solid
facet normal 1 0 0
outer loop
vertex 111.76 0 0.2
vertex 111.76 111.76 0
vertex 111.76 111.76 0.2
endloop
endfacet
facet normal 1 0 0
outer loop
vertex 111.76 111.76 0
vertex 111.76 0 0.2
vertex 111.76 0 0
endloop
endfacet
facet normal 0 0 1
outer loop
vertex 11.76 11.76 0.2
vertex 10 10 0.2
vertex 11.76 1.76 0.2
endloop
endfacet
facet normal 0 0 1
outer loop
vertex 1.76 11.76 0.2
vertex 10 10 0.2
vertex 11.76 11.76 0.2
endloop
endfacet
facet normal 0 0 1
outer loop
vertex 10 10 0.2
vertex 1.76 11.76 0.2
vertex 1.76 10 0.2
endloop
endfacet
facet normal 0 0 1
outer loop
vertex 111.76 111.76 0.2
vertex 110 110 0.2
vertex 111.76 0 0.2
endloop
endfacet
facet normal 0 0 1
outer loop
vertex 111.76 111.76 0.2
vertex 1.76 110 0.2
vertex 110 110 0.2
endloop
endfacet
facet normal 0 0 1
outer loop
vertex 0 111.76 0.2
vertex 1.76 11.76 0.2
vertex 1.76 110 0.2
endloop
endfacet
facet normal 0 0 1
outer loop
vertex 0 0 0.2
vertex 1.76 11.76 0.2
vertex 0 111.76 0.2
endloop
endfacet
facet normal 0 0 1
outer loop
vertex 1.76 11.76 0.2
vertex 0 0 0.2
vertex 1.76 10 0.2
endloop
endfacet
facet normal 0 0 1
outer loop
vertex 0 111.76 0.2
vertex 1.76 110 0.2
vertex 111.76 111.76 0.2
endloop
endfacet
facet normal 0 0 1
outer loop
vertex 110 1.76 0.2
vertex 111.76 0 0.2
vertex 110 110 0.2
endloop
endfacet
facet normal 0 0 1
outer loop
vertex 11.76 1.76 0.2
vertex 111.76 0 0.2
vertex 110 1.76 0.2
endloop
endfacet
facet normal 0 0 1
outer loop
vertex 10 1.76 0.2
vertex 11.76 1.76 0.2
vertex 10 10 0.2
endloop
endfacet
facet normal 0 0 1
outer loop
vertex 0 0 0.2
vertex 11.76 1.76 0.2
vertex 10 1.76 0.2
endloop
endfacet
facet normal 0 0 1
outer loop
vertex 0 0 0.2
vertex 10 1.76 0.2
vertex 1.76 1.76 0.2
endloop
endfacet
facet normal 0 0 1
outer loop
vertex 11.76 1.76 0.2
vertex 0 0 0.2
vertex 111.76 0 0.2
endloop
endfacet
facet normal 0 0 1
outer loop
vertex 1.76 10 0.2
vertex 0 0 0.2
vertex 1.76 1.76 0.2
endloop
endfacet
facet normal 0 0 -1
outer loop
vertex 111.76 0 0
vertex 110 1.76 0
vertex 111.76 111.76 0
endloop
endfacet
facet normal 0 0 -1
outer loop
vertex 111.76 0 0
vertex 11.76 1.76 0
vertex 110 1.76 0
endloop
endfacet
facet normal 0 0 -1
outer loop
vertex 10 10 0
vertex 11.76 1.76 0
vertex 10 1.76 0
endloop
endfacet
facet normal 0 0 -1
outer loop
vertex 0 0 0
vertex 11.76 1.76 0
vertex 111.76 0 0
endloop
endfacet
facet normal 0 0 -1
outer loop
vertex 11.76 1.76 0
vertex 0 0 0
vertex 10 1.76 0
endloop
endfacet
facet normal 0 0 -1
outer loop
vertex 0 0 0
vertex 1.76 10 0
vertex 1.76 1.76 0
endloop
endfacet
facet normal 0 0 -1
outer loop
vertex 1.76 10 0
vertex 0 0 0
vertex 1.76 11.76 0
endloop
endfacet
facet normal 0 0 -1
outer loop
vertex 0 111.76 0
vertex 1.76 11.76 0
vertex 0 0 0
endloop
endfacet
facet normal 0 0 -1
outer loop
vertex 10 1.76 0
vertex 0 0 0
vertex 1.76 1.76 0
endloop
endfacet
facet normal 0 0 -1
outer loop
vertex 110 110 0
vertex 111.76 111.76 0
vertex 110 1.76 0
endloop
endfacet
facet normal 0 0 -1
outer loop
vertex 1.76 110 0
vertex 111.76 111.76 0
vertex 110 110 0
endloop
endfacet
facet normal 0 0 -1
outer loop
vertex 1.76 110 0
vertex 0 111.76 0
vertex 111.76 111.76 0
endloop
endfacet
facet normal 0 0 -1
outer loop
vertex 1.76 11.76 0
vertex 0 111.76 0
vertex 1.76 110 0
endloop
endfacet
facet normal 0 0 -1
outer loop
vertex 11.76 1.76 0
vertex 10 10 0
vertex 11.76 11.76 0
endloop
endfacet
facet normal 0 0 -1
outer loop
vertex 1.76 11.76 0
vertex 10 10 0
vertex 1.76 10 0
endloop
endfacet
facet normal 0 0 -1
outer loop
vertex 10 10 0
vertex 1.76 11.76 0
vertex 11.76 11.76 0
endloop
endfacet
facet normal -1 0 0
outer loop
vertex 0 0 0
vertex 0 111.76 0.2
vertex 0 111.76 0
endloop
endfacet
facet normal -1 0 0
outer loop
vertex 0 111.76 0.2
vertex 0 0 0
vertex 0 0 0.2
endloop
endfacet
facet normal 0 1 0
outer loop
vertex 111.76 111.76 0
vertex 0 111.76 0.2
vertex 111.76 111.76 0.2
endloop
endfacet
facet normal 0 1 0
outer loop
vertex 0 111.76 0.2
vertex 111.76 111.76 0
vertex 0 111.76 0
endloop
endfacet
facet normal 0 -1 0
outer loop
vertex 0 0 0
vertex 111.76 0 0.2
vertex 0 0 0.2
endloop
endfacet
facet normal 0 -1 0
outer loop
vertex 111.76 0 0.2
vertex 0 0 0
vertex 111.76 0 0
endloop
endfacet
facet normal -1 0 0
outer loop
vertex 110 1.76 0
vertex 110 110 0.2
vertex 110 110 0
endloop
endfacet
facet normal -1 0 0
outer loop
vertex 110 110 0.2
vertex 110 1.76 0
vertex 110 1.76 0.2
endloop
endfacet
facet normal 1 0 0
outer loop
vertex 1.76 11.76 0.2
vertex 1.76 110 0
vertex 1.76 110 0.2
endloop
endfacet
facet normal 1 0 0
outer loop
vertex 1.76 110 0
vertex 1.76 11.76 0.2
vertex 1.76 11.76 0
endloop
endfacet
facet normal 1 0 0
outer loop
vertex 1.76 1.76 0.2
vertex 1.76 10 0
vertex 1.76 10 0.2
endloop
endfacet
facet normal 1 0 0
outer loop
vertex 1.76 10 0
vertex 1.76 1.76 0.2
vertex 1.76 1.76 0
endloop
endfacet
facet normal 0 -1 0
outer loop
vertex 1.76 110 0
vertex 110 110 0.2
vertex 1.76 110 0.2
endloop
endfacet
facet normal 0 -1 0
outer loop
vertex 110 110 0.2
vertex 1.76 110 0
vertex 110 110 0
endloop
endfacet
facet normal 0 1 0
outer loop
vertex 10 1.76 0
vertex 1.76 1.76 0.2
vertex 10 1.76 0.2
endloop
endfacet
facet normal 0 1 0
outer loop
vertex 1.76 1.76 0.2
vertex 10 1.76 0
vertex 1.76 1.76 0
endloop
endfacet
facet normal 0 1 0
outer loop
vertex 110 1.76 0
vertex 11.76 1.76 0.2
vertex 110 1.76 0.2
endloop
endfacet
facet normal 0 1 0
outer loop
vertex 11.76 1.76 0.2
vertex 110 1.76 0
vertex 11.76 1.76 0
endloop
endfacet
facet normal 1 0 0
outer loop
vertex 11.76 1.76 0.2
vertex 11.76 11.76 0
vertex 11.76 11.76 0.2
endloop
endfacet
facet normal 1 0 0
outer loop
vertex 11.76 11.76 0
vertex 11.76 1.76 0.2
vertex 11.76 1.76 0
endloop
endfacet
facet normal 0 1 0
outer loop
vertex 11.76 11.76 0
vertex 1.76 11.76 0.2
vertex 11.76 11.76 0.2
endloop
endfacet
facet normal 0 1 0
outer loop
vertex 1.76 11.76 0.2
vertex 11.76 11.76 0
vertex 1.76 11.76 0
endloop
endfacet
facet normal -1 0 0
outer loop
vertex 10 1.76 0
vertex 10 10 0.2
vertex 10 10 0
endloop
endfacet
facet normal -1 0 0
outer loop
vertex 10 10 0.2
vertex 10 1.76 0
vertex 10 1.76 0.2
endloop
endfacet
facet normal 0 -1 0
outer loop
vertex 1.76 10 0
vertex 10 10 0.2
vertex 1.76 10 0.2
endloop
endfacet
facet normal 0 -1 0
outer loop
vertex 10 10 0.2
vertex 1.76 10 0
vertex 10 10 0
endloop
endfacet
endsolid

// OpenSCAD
// Quick XY calibration

// You need to measure the distance between either inside of small rectangle to inside of big rectangle or outside of small rectangle to outside of big rectangle.
// Let the thing on print surface when you measure it. 
// published here https://www.thingiverse.com/thing:3655905
   
// Edit the part between the scissors 
// ------8<------------------------

//Calibration on X direction, the larger the better accuracy
XSize = 100;
//Calibration on Y direction, the larger the better accuracy
YSize = 100;
//Line width, the same as in slicer.
LWidth = 0.44;
//Line multiplier, the same as wall line count in slicer.
LMul = 4; 

// ------8<------------------------

difference() {
cube([10+XSize+LWidth*LMul,10+YSize+LWidth*LMul,0.2],false);
translate([LWidth*LMul,LWidth*LMul,0])    
cube([10+XSize-LWidth*LMul,10+YSize-LWidth*LMul,0.2],false);
}    
difference() 
{
    cube([10+LWidth*LMul,10+LWidth*LMul,0.2],false);
    translate([LWidth*LMul,LWidth*LMul,0])    
    cube([10-LWidth*LMul,10-LWidth*LMul,0.2],false);
}    
